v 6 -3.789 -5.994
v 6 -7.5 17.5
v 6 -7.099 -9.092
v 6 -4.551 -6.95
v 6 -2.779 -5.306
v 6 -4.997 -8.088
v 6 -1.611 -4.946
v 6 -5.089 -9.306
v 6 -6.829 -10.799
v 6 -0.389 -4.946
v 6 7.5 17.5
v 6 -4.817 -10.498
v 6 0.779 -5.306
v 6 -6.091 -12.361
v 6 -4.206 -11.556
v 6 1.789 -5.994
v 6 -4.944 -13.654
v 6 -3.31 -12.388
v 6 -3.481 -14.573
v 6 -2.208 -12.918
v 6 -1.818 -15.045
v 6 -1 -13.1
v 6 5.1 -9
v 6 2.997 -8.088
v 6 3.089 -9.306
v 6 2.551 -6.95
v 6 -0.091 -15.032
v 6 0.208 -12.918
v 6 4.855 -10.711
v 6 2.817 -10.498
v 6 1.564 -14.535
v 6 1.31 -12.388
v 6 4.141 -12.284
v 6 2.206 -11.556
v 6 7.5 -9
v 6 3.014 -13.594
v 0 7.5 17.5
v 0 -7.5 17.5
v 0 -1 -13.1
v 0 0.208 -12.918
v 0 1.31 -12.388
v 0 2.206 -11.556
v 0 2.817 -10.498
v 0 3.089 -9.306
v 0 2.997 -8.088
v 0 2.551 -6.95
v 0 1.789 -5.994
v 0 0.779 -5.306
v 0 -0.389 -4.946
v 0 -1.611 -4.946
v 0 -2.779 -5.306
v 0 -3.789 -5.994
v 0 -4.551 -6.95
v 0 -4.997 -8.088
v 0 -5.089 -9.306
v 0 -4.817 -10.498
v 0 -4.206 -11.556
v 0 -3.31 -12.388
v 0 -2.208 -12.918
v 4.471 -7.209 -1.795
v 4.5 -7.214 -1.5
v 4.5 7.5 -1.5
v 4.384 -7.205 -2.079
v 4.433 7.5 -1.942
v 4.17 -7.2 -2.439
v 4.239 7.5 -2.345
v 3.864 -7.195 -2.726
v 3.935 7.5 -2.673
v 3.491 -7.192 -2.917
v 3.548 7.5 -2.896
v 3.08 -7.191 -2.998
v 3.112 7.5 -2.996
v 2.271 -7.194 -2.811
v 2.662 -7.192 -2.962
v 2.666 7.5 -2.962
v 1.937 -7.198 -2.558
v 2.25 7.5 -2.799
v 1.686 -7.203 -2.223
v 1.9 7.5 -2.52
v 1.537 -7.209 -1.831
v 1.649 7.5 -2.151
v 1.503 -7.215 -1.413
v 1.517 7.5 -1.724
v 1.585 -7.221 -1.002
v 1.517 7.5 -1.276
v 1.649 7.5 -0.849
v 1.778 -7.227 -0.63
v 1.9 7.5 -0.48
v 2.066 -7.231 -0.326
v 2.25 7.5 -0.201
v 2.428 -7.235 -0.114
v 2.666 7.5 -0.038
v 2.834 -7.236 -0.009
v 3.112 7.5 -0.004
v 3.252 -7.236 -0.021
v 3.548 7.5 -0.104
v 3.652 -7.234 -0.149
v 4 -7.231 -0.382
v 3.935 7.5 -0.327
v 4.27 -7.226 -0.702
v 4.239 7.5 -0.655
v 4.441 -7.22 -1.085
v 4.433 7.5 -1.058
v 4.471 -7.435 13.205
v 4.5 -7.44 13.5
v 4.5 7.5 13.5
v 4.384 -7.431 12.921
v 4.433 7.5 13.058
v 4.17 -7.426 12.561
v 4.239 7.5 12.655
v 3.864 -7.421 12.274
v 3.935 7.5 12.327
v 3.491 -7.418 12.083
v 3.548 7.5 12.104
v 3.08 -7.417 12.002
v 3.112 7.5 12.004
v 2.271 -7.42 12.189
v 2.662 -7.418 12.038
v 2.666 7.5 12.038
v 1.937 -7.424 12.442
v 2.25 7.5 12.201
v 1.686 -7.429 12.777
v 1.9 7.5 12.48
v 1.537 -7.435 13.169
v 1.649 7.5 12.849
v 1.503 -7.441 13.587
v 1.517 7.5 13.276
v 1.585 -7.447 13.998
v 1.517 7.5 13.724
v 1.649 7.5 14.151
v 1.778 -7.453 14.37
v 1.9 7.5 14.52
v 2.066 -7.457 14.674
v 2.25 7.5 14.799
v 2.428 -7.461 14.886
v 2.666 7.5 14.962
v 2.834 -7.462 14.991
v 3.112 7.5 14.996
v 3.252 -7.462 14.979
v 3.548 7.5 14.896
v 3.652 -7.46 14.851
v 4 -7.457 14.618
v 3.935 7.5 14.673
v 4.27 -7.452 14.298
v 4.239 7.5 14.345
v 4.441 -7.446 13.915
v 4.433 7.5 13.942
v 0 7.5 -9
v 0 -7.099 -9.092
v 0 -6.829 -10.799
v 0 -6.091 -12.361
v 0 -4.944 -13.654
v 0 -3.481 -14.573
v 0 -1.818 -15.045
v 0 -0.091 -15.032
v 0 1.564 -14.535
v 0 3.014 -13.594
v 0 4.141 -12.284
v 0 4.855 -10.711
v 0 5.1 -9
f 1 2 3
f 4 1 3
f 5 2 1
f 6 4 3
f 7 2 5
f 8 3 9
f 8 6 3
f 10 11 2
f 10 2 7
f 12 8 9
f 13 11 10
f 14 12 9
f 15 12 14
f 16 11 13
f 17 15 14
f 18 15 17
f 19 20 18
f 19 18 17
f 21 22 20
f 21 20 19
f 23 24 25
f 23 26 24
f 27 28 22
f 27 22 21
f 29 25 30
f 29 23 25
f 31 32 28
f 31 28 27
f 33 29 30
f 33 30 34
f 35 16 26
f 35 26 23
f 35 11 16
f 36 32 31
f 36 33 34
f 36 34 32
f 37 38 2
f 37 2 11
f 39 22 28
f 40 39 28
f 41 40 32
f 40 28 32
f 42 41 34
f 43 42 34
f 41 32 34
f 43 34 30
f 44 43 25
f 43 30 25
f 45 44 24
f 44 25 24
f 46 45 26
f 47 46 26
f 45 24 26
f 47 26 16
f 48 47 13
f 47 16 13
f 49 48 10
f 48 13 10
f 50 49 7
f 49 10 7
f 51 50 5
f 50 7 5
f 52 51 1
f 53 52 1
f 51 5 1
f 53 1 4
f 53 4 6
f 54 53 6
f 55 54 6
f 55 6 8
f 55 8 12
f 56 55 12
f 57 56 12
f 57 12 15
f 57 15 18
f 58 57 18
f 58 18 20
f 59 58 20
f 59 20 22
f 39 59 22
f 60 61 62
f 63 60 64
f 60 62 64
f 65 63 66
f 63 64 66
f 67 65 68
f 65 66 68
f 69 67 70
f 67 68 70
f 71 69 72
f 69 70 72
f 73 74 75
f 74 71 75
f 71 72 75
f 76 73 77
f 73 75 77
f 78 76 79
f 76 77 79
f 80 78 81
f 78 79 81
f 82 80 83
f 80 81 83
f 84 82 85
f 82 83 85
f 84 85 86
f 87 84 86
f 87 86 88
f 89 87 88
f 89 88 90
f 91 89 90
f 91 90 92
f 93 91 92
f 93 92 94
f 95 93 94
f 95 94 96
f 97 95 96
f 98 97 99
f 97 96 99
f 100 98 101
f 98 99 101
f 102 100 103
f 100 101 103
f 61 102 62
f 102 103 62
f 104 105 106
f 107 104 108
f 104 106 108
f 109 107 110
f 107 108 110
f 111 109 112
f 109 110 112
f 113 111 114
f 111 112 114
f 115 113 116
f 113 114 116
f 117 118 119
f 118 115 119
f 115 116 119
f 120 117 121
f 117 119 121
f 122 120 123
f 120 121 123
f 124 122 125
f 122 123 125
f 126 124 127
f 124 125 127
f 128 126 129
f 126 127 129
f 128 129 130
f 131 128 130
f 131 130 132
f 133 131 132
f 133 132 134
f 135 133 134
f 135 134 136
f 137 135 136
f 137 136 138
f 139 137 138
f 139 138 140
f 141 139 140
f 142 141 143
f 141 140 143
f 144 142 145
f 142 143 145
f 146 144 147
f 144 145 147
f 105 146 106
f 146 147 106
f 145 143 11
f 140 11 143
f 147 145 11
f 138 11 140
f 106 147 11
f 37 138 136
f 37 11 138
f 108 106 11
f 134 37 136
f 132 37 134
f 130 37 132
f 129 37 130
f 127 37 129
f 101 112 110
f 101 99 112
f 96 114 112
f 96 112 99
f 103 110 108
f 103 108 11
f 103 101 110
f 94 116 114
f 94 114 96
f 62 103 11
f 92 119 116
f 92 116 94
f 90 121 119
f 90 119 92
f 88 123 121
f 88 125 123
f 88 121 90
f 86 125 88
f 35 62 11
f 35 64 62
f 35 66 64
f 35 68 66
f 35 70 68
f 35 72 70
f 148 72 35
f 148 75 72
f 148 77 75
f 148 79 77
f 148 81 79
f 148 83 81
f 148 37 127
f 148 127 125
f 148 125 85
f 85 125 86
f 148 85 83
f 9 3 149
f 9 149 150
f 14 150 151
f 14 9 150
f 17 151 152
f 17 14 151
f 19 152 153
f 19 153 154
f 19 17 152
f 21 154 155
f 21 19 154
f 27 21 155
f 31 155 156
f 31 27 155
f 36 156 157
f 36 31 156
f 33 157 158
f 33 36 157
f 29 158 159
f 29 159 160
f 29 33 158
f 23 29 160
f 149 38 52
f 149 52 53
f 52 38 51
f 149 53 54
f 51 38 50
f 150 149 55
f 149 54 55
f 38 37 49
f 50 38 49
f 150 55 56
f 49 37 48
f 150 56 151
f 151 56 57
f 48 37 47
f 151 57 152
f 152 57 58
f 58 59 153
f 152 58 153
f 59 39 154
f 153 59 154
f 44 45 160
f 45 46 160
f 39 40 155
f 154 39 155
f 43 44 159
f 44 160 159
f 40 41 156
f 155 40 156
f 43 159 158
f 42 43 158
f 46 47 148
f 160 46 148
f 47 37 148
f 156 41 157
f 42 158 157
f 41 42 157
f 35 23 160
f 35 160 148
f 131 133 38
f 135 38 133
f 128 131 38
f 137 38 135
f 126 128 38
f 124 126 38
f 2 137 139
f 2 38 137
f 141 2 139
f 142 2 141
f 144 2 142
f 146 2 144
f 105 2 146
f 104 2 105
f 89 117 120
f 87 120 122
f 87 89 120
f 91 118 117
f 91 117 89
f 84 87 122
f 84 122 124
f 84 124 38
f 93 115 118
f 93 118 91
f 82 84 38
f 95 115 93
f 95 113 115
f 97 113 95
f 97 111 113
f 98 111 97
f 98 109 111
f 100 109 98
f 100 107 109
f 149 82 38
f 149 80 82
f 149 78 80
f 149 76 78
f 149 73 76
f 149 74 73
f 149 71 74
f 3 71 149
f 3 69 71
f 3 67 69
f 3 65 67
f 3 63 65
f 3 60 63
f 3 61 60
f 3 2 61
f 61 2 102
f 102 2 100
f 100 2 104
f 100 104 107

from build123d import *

# Parameters (mm, degrees)
SKETCH_1_W          = 35
SKETCH_1_H          = 15
EXTRUDE_1_DEPTH     = 6
SKETCH_2_R          = 1.5
CUT_EXTRUDE_1_DEPTH = 16
SKETCH_3_R          = 4.1
CUT_EXTRUDE_2_DEPTH = 7
CUT_EXTRUDE_3_DEPTH = 7


with BuildPart() as part:
    # 草图1 → 凸台-拉伸1 (new body)
    with BuildSketch(Plane(origin=(0, 0, 0), x_dir=(0, 0, -1), z_dir=(1, 0, 0))):
        Rectangle(SKETCH_1_W, SKETCH_1_H)
    extrude(amount=EXTRUDE_1_DEPTH)

    # 草图2 → 切除-拉伸1 (cut, through all)
    with BuildSketch(Plane(origin=(0, 7.5, 0), x_dir=(1, 0, 0), z_dir=(0, 1, 0))):
        with Locations((3, -13.5)):
            Circle(SKETCH_2_R)
        with Locations((3, 1.5)):
            Circle(SKETCH_2_R)
    extrude(amount=-CUT_EXTRUDE_1_DEPTH, mode=Mode.SUBTRACT)

    # 草图3 → 切除-拉伸2 (cut, through all)
    with BuildSketch(Plane(origin=(6, 0, 0), x_dir=(0, 0, -1), z_dir=(1, 0, 0))):
        with Locations((9, -1)):
            Circle(SKETCH_3_R)
    extrude(amount=-CUT_EXTRUDE_2_DEPTH, mode=Mode.SUBTRACT)

    # 草图4 → 切除-拉伸3 (cut, through all)
    with BuildSketch(Plane(origin=(6, 0, 0), x_dir=(0, 0, -1), z_dir=(1, 0, 0))):
        with BuildLine():
            Line((9, 5.1), (9, 7.5))
            Line((9, 7.5), (17.5, 7.5))
            Line((17.5, 7.5), (17.5, -7.5))
            Line((17.5, -7.5), (-17.5, -7.5))
            Line((-17.5, -7.5), (9.091905641, -7.099307613))
            ThreePointArc((9.091905641, -7.099307613), (15.099826901, -0.954045876), (9, 5.1))
        make_face()
    extrude(amount=-CUT_EXTRUDE_3_DEPTH, mode=Mode.SUBTRACT)


solid = part.part
